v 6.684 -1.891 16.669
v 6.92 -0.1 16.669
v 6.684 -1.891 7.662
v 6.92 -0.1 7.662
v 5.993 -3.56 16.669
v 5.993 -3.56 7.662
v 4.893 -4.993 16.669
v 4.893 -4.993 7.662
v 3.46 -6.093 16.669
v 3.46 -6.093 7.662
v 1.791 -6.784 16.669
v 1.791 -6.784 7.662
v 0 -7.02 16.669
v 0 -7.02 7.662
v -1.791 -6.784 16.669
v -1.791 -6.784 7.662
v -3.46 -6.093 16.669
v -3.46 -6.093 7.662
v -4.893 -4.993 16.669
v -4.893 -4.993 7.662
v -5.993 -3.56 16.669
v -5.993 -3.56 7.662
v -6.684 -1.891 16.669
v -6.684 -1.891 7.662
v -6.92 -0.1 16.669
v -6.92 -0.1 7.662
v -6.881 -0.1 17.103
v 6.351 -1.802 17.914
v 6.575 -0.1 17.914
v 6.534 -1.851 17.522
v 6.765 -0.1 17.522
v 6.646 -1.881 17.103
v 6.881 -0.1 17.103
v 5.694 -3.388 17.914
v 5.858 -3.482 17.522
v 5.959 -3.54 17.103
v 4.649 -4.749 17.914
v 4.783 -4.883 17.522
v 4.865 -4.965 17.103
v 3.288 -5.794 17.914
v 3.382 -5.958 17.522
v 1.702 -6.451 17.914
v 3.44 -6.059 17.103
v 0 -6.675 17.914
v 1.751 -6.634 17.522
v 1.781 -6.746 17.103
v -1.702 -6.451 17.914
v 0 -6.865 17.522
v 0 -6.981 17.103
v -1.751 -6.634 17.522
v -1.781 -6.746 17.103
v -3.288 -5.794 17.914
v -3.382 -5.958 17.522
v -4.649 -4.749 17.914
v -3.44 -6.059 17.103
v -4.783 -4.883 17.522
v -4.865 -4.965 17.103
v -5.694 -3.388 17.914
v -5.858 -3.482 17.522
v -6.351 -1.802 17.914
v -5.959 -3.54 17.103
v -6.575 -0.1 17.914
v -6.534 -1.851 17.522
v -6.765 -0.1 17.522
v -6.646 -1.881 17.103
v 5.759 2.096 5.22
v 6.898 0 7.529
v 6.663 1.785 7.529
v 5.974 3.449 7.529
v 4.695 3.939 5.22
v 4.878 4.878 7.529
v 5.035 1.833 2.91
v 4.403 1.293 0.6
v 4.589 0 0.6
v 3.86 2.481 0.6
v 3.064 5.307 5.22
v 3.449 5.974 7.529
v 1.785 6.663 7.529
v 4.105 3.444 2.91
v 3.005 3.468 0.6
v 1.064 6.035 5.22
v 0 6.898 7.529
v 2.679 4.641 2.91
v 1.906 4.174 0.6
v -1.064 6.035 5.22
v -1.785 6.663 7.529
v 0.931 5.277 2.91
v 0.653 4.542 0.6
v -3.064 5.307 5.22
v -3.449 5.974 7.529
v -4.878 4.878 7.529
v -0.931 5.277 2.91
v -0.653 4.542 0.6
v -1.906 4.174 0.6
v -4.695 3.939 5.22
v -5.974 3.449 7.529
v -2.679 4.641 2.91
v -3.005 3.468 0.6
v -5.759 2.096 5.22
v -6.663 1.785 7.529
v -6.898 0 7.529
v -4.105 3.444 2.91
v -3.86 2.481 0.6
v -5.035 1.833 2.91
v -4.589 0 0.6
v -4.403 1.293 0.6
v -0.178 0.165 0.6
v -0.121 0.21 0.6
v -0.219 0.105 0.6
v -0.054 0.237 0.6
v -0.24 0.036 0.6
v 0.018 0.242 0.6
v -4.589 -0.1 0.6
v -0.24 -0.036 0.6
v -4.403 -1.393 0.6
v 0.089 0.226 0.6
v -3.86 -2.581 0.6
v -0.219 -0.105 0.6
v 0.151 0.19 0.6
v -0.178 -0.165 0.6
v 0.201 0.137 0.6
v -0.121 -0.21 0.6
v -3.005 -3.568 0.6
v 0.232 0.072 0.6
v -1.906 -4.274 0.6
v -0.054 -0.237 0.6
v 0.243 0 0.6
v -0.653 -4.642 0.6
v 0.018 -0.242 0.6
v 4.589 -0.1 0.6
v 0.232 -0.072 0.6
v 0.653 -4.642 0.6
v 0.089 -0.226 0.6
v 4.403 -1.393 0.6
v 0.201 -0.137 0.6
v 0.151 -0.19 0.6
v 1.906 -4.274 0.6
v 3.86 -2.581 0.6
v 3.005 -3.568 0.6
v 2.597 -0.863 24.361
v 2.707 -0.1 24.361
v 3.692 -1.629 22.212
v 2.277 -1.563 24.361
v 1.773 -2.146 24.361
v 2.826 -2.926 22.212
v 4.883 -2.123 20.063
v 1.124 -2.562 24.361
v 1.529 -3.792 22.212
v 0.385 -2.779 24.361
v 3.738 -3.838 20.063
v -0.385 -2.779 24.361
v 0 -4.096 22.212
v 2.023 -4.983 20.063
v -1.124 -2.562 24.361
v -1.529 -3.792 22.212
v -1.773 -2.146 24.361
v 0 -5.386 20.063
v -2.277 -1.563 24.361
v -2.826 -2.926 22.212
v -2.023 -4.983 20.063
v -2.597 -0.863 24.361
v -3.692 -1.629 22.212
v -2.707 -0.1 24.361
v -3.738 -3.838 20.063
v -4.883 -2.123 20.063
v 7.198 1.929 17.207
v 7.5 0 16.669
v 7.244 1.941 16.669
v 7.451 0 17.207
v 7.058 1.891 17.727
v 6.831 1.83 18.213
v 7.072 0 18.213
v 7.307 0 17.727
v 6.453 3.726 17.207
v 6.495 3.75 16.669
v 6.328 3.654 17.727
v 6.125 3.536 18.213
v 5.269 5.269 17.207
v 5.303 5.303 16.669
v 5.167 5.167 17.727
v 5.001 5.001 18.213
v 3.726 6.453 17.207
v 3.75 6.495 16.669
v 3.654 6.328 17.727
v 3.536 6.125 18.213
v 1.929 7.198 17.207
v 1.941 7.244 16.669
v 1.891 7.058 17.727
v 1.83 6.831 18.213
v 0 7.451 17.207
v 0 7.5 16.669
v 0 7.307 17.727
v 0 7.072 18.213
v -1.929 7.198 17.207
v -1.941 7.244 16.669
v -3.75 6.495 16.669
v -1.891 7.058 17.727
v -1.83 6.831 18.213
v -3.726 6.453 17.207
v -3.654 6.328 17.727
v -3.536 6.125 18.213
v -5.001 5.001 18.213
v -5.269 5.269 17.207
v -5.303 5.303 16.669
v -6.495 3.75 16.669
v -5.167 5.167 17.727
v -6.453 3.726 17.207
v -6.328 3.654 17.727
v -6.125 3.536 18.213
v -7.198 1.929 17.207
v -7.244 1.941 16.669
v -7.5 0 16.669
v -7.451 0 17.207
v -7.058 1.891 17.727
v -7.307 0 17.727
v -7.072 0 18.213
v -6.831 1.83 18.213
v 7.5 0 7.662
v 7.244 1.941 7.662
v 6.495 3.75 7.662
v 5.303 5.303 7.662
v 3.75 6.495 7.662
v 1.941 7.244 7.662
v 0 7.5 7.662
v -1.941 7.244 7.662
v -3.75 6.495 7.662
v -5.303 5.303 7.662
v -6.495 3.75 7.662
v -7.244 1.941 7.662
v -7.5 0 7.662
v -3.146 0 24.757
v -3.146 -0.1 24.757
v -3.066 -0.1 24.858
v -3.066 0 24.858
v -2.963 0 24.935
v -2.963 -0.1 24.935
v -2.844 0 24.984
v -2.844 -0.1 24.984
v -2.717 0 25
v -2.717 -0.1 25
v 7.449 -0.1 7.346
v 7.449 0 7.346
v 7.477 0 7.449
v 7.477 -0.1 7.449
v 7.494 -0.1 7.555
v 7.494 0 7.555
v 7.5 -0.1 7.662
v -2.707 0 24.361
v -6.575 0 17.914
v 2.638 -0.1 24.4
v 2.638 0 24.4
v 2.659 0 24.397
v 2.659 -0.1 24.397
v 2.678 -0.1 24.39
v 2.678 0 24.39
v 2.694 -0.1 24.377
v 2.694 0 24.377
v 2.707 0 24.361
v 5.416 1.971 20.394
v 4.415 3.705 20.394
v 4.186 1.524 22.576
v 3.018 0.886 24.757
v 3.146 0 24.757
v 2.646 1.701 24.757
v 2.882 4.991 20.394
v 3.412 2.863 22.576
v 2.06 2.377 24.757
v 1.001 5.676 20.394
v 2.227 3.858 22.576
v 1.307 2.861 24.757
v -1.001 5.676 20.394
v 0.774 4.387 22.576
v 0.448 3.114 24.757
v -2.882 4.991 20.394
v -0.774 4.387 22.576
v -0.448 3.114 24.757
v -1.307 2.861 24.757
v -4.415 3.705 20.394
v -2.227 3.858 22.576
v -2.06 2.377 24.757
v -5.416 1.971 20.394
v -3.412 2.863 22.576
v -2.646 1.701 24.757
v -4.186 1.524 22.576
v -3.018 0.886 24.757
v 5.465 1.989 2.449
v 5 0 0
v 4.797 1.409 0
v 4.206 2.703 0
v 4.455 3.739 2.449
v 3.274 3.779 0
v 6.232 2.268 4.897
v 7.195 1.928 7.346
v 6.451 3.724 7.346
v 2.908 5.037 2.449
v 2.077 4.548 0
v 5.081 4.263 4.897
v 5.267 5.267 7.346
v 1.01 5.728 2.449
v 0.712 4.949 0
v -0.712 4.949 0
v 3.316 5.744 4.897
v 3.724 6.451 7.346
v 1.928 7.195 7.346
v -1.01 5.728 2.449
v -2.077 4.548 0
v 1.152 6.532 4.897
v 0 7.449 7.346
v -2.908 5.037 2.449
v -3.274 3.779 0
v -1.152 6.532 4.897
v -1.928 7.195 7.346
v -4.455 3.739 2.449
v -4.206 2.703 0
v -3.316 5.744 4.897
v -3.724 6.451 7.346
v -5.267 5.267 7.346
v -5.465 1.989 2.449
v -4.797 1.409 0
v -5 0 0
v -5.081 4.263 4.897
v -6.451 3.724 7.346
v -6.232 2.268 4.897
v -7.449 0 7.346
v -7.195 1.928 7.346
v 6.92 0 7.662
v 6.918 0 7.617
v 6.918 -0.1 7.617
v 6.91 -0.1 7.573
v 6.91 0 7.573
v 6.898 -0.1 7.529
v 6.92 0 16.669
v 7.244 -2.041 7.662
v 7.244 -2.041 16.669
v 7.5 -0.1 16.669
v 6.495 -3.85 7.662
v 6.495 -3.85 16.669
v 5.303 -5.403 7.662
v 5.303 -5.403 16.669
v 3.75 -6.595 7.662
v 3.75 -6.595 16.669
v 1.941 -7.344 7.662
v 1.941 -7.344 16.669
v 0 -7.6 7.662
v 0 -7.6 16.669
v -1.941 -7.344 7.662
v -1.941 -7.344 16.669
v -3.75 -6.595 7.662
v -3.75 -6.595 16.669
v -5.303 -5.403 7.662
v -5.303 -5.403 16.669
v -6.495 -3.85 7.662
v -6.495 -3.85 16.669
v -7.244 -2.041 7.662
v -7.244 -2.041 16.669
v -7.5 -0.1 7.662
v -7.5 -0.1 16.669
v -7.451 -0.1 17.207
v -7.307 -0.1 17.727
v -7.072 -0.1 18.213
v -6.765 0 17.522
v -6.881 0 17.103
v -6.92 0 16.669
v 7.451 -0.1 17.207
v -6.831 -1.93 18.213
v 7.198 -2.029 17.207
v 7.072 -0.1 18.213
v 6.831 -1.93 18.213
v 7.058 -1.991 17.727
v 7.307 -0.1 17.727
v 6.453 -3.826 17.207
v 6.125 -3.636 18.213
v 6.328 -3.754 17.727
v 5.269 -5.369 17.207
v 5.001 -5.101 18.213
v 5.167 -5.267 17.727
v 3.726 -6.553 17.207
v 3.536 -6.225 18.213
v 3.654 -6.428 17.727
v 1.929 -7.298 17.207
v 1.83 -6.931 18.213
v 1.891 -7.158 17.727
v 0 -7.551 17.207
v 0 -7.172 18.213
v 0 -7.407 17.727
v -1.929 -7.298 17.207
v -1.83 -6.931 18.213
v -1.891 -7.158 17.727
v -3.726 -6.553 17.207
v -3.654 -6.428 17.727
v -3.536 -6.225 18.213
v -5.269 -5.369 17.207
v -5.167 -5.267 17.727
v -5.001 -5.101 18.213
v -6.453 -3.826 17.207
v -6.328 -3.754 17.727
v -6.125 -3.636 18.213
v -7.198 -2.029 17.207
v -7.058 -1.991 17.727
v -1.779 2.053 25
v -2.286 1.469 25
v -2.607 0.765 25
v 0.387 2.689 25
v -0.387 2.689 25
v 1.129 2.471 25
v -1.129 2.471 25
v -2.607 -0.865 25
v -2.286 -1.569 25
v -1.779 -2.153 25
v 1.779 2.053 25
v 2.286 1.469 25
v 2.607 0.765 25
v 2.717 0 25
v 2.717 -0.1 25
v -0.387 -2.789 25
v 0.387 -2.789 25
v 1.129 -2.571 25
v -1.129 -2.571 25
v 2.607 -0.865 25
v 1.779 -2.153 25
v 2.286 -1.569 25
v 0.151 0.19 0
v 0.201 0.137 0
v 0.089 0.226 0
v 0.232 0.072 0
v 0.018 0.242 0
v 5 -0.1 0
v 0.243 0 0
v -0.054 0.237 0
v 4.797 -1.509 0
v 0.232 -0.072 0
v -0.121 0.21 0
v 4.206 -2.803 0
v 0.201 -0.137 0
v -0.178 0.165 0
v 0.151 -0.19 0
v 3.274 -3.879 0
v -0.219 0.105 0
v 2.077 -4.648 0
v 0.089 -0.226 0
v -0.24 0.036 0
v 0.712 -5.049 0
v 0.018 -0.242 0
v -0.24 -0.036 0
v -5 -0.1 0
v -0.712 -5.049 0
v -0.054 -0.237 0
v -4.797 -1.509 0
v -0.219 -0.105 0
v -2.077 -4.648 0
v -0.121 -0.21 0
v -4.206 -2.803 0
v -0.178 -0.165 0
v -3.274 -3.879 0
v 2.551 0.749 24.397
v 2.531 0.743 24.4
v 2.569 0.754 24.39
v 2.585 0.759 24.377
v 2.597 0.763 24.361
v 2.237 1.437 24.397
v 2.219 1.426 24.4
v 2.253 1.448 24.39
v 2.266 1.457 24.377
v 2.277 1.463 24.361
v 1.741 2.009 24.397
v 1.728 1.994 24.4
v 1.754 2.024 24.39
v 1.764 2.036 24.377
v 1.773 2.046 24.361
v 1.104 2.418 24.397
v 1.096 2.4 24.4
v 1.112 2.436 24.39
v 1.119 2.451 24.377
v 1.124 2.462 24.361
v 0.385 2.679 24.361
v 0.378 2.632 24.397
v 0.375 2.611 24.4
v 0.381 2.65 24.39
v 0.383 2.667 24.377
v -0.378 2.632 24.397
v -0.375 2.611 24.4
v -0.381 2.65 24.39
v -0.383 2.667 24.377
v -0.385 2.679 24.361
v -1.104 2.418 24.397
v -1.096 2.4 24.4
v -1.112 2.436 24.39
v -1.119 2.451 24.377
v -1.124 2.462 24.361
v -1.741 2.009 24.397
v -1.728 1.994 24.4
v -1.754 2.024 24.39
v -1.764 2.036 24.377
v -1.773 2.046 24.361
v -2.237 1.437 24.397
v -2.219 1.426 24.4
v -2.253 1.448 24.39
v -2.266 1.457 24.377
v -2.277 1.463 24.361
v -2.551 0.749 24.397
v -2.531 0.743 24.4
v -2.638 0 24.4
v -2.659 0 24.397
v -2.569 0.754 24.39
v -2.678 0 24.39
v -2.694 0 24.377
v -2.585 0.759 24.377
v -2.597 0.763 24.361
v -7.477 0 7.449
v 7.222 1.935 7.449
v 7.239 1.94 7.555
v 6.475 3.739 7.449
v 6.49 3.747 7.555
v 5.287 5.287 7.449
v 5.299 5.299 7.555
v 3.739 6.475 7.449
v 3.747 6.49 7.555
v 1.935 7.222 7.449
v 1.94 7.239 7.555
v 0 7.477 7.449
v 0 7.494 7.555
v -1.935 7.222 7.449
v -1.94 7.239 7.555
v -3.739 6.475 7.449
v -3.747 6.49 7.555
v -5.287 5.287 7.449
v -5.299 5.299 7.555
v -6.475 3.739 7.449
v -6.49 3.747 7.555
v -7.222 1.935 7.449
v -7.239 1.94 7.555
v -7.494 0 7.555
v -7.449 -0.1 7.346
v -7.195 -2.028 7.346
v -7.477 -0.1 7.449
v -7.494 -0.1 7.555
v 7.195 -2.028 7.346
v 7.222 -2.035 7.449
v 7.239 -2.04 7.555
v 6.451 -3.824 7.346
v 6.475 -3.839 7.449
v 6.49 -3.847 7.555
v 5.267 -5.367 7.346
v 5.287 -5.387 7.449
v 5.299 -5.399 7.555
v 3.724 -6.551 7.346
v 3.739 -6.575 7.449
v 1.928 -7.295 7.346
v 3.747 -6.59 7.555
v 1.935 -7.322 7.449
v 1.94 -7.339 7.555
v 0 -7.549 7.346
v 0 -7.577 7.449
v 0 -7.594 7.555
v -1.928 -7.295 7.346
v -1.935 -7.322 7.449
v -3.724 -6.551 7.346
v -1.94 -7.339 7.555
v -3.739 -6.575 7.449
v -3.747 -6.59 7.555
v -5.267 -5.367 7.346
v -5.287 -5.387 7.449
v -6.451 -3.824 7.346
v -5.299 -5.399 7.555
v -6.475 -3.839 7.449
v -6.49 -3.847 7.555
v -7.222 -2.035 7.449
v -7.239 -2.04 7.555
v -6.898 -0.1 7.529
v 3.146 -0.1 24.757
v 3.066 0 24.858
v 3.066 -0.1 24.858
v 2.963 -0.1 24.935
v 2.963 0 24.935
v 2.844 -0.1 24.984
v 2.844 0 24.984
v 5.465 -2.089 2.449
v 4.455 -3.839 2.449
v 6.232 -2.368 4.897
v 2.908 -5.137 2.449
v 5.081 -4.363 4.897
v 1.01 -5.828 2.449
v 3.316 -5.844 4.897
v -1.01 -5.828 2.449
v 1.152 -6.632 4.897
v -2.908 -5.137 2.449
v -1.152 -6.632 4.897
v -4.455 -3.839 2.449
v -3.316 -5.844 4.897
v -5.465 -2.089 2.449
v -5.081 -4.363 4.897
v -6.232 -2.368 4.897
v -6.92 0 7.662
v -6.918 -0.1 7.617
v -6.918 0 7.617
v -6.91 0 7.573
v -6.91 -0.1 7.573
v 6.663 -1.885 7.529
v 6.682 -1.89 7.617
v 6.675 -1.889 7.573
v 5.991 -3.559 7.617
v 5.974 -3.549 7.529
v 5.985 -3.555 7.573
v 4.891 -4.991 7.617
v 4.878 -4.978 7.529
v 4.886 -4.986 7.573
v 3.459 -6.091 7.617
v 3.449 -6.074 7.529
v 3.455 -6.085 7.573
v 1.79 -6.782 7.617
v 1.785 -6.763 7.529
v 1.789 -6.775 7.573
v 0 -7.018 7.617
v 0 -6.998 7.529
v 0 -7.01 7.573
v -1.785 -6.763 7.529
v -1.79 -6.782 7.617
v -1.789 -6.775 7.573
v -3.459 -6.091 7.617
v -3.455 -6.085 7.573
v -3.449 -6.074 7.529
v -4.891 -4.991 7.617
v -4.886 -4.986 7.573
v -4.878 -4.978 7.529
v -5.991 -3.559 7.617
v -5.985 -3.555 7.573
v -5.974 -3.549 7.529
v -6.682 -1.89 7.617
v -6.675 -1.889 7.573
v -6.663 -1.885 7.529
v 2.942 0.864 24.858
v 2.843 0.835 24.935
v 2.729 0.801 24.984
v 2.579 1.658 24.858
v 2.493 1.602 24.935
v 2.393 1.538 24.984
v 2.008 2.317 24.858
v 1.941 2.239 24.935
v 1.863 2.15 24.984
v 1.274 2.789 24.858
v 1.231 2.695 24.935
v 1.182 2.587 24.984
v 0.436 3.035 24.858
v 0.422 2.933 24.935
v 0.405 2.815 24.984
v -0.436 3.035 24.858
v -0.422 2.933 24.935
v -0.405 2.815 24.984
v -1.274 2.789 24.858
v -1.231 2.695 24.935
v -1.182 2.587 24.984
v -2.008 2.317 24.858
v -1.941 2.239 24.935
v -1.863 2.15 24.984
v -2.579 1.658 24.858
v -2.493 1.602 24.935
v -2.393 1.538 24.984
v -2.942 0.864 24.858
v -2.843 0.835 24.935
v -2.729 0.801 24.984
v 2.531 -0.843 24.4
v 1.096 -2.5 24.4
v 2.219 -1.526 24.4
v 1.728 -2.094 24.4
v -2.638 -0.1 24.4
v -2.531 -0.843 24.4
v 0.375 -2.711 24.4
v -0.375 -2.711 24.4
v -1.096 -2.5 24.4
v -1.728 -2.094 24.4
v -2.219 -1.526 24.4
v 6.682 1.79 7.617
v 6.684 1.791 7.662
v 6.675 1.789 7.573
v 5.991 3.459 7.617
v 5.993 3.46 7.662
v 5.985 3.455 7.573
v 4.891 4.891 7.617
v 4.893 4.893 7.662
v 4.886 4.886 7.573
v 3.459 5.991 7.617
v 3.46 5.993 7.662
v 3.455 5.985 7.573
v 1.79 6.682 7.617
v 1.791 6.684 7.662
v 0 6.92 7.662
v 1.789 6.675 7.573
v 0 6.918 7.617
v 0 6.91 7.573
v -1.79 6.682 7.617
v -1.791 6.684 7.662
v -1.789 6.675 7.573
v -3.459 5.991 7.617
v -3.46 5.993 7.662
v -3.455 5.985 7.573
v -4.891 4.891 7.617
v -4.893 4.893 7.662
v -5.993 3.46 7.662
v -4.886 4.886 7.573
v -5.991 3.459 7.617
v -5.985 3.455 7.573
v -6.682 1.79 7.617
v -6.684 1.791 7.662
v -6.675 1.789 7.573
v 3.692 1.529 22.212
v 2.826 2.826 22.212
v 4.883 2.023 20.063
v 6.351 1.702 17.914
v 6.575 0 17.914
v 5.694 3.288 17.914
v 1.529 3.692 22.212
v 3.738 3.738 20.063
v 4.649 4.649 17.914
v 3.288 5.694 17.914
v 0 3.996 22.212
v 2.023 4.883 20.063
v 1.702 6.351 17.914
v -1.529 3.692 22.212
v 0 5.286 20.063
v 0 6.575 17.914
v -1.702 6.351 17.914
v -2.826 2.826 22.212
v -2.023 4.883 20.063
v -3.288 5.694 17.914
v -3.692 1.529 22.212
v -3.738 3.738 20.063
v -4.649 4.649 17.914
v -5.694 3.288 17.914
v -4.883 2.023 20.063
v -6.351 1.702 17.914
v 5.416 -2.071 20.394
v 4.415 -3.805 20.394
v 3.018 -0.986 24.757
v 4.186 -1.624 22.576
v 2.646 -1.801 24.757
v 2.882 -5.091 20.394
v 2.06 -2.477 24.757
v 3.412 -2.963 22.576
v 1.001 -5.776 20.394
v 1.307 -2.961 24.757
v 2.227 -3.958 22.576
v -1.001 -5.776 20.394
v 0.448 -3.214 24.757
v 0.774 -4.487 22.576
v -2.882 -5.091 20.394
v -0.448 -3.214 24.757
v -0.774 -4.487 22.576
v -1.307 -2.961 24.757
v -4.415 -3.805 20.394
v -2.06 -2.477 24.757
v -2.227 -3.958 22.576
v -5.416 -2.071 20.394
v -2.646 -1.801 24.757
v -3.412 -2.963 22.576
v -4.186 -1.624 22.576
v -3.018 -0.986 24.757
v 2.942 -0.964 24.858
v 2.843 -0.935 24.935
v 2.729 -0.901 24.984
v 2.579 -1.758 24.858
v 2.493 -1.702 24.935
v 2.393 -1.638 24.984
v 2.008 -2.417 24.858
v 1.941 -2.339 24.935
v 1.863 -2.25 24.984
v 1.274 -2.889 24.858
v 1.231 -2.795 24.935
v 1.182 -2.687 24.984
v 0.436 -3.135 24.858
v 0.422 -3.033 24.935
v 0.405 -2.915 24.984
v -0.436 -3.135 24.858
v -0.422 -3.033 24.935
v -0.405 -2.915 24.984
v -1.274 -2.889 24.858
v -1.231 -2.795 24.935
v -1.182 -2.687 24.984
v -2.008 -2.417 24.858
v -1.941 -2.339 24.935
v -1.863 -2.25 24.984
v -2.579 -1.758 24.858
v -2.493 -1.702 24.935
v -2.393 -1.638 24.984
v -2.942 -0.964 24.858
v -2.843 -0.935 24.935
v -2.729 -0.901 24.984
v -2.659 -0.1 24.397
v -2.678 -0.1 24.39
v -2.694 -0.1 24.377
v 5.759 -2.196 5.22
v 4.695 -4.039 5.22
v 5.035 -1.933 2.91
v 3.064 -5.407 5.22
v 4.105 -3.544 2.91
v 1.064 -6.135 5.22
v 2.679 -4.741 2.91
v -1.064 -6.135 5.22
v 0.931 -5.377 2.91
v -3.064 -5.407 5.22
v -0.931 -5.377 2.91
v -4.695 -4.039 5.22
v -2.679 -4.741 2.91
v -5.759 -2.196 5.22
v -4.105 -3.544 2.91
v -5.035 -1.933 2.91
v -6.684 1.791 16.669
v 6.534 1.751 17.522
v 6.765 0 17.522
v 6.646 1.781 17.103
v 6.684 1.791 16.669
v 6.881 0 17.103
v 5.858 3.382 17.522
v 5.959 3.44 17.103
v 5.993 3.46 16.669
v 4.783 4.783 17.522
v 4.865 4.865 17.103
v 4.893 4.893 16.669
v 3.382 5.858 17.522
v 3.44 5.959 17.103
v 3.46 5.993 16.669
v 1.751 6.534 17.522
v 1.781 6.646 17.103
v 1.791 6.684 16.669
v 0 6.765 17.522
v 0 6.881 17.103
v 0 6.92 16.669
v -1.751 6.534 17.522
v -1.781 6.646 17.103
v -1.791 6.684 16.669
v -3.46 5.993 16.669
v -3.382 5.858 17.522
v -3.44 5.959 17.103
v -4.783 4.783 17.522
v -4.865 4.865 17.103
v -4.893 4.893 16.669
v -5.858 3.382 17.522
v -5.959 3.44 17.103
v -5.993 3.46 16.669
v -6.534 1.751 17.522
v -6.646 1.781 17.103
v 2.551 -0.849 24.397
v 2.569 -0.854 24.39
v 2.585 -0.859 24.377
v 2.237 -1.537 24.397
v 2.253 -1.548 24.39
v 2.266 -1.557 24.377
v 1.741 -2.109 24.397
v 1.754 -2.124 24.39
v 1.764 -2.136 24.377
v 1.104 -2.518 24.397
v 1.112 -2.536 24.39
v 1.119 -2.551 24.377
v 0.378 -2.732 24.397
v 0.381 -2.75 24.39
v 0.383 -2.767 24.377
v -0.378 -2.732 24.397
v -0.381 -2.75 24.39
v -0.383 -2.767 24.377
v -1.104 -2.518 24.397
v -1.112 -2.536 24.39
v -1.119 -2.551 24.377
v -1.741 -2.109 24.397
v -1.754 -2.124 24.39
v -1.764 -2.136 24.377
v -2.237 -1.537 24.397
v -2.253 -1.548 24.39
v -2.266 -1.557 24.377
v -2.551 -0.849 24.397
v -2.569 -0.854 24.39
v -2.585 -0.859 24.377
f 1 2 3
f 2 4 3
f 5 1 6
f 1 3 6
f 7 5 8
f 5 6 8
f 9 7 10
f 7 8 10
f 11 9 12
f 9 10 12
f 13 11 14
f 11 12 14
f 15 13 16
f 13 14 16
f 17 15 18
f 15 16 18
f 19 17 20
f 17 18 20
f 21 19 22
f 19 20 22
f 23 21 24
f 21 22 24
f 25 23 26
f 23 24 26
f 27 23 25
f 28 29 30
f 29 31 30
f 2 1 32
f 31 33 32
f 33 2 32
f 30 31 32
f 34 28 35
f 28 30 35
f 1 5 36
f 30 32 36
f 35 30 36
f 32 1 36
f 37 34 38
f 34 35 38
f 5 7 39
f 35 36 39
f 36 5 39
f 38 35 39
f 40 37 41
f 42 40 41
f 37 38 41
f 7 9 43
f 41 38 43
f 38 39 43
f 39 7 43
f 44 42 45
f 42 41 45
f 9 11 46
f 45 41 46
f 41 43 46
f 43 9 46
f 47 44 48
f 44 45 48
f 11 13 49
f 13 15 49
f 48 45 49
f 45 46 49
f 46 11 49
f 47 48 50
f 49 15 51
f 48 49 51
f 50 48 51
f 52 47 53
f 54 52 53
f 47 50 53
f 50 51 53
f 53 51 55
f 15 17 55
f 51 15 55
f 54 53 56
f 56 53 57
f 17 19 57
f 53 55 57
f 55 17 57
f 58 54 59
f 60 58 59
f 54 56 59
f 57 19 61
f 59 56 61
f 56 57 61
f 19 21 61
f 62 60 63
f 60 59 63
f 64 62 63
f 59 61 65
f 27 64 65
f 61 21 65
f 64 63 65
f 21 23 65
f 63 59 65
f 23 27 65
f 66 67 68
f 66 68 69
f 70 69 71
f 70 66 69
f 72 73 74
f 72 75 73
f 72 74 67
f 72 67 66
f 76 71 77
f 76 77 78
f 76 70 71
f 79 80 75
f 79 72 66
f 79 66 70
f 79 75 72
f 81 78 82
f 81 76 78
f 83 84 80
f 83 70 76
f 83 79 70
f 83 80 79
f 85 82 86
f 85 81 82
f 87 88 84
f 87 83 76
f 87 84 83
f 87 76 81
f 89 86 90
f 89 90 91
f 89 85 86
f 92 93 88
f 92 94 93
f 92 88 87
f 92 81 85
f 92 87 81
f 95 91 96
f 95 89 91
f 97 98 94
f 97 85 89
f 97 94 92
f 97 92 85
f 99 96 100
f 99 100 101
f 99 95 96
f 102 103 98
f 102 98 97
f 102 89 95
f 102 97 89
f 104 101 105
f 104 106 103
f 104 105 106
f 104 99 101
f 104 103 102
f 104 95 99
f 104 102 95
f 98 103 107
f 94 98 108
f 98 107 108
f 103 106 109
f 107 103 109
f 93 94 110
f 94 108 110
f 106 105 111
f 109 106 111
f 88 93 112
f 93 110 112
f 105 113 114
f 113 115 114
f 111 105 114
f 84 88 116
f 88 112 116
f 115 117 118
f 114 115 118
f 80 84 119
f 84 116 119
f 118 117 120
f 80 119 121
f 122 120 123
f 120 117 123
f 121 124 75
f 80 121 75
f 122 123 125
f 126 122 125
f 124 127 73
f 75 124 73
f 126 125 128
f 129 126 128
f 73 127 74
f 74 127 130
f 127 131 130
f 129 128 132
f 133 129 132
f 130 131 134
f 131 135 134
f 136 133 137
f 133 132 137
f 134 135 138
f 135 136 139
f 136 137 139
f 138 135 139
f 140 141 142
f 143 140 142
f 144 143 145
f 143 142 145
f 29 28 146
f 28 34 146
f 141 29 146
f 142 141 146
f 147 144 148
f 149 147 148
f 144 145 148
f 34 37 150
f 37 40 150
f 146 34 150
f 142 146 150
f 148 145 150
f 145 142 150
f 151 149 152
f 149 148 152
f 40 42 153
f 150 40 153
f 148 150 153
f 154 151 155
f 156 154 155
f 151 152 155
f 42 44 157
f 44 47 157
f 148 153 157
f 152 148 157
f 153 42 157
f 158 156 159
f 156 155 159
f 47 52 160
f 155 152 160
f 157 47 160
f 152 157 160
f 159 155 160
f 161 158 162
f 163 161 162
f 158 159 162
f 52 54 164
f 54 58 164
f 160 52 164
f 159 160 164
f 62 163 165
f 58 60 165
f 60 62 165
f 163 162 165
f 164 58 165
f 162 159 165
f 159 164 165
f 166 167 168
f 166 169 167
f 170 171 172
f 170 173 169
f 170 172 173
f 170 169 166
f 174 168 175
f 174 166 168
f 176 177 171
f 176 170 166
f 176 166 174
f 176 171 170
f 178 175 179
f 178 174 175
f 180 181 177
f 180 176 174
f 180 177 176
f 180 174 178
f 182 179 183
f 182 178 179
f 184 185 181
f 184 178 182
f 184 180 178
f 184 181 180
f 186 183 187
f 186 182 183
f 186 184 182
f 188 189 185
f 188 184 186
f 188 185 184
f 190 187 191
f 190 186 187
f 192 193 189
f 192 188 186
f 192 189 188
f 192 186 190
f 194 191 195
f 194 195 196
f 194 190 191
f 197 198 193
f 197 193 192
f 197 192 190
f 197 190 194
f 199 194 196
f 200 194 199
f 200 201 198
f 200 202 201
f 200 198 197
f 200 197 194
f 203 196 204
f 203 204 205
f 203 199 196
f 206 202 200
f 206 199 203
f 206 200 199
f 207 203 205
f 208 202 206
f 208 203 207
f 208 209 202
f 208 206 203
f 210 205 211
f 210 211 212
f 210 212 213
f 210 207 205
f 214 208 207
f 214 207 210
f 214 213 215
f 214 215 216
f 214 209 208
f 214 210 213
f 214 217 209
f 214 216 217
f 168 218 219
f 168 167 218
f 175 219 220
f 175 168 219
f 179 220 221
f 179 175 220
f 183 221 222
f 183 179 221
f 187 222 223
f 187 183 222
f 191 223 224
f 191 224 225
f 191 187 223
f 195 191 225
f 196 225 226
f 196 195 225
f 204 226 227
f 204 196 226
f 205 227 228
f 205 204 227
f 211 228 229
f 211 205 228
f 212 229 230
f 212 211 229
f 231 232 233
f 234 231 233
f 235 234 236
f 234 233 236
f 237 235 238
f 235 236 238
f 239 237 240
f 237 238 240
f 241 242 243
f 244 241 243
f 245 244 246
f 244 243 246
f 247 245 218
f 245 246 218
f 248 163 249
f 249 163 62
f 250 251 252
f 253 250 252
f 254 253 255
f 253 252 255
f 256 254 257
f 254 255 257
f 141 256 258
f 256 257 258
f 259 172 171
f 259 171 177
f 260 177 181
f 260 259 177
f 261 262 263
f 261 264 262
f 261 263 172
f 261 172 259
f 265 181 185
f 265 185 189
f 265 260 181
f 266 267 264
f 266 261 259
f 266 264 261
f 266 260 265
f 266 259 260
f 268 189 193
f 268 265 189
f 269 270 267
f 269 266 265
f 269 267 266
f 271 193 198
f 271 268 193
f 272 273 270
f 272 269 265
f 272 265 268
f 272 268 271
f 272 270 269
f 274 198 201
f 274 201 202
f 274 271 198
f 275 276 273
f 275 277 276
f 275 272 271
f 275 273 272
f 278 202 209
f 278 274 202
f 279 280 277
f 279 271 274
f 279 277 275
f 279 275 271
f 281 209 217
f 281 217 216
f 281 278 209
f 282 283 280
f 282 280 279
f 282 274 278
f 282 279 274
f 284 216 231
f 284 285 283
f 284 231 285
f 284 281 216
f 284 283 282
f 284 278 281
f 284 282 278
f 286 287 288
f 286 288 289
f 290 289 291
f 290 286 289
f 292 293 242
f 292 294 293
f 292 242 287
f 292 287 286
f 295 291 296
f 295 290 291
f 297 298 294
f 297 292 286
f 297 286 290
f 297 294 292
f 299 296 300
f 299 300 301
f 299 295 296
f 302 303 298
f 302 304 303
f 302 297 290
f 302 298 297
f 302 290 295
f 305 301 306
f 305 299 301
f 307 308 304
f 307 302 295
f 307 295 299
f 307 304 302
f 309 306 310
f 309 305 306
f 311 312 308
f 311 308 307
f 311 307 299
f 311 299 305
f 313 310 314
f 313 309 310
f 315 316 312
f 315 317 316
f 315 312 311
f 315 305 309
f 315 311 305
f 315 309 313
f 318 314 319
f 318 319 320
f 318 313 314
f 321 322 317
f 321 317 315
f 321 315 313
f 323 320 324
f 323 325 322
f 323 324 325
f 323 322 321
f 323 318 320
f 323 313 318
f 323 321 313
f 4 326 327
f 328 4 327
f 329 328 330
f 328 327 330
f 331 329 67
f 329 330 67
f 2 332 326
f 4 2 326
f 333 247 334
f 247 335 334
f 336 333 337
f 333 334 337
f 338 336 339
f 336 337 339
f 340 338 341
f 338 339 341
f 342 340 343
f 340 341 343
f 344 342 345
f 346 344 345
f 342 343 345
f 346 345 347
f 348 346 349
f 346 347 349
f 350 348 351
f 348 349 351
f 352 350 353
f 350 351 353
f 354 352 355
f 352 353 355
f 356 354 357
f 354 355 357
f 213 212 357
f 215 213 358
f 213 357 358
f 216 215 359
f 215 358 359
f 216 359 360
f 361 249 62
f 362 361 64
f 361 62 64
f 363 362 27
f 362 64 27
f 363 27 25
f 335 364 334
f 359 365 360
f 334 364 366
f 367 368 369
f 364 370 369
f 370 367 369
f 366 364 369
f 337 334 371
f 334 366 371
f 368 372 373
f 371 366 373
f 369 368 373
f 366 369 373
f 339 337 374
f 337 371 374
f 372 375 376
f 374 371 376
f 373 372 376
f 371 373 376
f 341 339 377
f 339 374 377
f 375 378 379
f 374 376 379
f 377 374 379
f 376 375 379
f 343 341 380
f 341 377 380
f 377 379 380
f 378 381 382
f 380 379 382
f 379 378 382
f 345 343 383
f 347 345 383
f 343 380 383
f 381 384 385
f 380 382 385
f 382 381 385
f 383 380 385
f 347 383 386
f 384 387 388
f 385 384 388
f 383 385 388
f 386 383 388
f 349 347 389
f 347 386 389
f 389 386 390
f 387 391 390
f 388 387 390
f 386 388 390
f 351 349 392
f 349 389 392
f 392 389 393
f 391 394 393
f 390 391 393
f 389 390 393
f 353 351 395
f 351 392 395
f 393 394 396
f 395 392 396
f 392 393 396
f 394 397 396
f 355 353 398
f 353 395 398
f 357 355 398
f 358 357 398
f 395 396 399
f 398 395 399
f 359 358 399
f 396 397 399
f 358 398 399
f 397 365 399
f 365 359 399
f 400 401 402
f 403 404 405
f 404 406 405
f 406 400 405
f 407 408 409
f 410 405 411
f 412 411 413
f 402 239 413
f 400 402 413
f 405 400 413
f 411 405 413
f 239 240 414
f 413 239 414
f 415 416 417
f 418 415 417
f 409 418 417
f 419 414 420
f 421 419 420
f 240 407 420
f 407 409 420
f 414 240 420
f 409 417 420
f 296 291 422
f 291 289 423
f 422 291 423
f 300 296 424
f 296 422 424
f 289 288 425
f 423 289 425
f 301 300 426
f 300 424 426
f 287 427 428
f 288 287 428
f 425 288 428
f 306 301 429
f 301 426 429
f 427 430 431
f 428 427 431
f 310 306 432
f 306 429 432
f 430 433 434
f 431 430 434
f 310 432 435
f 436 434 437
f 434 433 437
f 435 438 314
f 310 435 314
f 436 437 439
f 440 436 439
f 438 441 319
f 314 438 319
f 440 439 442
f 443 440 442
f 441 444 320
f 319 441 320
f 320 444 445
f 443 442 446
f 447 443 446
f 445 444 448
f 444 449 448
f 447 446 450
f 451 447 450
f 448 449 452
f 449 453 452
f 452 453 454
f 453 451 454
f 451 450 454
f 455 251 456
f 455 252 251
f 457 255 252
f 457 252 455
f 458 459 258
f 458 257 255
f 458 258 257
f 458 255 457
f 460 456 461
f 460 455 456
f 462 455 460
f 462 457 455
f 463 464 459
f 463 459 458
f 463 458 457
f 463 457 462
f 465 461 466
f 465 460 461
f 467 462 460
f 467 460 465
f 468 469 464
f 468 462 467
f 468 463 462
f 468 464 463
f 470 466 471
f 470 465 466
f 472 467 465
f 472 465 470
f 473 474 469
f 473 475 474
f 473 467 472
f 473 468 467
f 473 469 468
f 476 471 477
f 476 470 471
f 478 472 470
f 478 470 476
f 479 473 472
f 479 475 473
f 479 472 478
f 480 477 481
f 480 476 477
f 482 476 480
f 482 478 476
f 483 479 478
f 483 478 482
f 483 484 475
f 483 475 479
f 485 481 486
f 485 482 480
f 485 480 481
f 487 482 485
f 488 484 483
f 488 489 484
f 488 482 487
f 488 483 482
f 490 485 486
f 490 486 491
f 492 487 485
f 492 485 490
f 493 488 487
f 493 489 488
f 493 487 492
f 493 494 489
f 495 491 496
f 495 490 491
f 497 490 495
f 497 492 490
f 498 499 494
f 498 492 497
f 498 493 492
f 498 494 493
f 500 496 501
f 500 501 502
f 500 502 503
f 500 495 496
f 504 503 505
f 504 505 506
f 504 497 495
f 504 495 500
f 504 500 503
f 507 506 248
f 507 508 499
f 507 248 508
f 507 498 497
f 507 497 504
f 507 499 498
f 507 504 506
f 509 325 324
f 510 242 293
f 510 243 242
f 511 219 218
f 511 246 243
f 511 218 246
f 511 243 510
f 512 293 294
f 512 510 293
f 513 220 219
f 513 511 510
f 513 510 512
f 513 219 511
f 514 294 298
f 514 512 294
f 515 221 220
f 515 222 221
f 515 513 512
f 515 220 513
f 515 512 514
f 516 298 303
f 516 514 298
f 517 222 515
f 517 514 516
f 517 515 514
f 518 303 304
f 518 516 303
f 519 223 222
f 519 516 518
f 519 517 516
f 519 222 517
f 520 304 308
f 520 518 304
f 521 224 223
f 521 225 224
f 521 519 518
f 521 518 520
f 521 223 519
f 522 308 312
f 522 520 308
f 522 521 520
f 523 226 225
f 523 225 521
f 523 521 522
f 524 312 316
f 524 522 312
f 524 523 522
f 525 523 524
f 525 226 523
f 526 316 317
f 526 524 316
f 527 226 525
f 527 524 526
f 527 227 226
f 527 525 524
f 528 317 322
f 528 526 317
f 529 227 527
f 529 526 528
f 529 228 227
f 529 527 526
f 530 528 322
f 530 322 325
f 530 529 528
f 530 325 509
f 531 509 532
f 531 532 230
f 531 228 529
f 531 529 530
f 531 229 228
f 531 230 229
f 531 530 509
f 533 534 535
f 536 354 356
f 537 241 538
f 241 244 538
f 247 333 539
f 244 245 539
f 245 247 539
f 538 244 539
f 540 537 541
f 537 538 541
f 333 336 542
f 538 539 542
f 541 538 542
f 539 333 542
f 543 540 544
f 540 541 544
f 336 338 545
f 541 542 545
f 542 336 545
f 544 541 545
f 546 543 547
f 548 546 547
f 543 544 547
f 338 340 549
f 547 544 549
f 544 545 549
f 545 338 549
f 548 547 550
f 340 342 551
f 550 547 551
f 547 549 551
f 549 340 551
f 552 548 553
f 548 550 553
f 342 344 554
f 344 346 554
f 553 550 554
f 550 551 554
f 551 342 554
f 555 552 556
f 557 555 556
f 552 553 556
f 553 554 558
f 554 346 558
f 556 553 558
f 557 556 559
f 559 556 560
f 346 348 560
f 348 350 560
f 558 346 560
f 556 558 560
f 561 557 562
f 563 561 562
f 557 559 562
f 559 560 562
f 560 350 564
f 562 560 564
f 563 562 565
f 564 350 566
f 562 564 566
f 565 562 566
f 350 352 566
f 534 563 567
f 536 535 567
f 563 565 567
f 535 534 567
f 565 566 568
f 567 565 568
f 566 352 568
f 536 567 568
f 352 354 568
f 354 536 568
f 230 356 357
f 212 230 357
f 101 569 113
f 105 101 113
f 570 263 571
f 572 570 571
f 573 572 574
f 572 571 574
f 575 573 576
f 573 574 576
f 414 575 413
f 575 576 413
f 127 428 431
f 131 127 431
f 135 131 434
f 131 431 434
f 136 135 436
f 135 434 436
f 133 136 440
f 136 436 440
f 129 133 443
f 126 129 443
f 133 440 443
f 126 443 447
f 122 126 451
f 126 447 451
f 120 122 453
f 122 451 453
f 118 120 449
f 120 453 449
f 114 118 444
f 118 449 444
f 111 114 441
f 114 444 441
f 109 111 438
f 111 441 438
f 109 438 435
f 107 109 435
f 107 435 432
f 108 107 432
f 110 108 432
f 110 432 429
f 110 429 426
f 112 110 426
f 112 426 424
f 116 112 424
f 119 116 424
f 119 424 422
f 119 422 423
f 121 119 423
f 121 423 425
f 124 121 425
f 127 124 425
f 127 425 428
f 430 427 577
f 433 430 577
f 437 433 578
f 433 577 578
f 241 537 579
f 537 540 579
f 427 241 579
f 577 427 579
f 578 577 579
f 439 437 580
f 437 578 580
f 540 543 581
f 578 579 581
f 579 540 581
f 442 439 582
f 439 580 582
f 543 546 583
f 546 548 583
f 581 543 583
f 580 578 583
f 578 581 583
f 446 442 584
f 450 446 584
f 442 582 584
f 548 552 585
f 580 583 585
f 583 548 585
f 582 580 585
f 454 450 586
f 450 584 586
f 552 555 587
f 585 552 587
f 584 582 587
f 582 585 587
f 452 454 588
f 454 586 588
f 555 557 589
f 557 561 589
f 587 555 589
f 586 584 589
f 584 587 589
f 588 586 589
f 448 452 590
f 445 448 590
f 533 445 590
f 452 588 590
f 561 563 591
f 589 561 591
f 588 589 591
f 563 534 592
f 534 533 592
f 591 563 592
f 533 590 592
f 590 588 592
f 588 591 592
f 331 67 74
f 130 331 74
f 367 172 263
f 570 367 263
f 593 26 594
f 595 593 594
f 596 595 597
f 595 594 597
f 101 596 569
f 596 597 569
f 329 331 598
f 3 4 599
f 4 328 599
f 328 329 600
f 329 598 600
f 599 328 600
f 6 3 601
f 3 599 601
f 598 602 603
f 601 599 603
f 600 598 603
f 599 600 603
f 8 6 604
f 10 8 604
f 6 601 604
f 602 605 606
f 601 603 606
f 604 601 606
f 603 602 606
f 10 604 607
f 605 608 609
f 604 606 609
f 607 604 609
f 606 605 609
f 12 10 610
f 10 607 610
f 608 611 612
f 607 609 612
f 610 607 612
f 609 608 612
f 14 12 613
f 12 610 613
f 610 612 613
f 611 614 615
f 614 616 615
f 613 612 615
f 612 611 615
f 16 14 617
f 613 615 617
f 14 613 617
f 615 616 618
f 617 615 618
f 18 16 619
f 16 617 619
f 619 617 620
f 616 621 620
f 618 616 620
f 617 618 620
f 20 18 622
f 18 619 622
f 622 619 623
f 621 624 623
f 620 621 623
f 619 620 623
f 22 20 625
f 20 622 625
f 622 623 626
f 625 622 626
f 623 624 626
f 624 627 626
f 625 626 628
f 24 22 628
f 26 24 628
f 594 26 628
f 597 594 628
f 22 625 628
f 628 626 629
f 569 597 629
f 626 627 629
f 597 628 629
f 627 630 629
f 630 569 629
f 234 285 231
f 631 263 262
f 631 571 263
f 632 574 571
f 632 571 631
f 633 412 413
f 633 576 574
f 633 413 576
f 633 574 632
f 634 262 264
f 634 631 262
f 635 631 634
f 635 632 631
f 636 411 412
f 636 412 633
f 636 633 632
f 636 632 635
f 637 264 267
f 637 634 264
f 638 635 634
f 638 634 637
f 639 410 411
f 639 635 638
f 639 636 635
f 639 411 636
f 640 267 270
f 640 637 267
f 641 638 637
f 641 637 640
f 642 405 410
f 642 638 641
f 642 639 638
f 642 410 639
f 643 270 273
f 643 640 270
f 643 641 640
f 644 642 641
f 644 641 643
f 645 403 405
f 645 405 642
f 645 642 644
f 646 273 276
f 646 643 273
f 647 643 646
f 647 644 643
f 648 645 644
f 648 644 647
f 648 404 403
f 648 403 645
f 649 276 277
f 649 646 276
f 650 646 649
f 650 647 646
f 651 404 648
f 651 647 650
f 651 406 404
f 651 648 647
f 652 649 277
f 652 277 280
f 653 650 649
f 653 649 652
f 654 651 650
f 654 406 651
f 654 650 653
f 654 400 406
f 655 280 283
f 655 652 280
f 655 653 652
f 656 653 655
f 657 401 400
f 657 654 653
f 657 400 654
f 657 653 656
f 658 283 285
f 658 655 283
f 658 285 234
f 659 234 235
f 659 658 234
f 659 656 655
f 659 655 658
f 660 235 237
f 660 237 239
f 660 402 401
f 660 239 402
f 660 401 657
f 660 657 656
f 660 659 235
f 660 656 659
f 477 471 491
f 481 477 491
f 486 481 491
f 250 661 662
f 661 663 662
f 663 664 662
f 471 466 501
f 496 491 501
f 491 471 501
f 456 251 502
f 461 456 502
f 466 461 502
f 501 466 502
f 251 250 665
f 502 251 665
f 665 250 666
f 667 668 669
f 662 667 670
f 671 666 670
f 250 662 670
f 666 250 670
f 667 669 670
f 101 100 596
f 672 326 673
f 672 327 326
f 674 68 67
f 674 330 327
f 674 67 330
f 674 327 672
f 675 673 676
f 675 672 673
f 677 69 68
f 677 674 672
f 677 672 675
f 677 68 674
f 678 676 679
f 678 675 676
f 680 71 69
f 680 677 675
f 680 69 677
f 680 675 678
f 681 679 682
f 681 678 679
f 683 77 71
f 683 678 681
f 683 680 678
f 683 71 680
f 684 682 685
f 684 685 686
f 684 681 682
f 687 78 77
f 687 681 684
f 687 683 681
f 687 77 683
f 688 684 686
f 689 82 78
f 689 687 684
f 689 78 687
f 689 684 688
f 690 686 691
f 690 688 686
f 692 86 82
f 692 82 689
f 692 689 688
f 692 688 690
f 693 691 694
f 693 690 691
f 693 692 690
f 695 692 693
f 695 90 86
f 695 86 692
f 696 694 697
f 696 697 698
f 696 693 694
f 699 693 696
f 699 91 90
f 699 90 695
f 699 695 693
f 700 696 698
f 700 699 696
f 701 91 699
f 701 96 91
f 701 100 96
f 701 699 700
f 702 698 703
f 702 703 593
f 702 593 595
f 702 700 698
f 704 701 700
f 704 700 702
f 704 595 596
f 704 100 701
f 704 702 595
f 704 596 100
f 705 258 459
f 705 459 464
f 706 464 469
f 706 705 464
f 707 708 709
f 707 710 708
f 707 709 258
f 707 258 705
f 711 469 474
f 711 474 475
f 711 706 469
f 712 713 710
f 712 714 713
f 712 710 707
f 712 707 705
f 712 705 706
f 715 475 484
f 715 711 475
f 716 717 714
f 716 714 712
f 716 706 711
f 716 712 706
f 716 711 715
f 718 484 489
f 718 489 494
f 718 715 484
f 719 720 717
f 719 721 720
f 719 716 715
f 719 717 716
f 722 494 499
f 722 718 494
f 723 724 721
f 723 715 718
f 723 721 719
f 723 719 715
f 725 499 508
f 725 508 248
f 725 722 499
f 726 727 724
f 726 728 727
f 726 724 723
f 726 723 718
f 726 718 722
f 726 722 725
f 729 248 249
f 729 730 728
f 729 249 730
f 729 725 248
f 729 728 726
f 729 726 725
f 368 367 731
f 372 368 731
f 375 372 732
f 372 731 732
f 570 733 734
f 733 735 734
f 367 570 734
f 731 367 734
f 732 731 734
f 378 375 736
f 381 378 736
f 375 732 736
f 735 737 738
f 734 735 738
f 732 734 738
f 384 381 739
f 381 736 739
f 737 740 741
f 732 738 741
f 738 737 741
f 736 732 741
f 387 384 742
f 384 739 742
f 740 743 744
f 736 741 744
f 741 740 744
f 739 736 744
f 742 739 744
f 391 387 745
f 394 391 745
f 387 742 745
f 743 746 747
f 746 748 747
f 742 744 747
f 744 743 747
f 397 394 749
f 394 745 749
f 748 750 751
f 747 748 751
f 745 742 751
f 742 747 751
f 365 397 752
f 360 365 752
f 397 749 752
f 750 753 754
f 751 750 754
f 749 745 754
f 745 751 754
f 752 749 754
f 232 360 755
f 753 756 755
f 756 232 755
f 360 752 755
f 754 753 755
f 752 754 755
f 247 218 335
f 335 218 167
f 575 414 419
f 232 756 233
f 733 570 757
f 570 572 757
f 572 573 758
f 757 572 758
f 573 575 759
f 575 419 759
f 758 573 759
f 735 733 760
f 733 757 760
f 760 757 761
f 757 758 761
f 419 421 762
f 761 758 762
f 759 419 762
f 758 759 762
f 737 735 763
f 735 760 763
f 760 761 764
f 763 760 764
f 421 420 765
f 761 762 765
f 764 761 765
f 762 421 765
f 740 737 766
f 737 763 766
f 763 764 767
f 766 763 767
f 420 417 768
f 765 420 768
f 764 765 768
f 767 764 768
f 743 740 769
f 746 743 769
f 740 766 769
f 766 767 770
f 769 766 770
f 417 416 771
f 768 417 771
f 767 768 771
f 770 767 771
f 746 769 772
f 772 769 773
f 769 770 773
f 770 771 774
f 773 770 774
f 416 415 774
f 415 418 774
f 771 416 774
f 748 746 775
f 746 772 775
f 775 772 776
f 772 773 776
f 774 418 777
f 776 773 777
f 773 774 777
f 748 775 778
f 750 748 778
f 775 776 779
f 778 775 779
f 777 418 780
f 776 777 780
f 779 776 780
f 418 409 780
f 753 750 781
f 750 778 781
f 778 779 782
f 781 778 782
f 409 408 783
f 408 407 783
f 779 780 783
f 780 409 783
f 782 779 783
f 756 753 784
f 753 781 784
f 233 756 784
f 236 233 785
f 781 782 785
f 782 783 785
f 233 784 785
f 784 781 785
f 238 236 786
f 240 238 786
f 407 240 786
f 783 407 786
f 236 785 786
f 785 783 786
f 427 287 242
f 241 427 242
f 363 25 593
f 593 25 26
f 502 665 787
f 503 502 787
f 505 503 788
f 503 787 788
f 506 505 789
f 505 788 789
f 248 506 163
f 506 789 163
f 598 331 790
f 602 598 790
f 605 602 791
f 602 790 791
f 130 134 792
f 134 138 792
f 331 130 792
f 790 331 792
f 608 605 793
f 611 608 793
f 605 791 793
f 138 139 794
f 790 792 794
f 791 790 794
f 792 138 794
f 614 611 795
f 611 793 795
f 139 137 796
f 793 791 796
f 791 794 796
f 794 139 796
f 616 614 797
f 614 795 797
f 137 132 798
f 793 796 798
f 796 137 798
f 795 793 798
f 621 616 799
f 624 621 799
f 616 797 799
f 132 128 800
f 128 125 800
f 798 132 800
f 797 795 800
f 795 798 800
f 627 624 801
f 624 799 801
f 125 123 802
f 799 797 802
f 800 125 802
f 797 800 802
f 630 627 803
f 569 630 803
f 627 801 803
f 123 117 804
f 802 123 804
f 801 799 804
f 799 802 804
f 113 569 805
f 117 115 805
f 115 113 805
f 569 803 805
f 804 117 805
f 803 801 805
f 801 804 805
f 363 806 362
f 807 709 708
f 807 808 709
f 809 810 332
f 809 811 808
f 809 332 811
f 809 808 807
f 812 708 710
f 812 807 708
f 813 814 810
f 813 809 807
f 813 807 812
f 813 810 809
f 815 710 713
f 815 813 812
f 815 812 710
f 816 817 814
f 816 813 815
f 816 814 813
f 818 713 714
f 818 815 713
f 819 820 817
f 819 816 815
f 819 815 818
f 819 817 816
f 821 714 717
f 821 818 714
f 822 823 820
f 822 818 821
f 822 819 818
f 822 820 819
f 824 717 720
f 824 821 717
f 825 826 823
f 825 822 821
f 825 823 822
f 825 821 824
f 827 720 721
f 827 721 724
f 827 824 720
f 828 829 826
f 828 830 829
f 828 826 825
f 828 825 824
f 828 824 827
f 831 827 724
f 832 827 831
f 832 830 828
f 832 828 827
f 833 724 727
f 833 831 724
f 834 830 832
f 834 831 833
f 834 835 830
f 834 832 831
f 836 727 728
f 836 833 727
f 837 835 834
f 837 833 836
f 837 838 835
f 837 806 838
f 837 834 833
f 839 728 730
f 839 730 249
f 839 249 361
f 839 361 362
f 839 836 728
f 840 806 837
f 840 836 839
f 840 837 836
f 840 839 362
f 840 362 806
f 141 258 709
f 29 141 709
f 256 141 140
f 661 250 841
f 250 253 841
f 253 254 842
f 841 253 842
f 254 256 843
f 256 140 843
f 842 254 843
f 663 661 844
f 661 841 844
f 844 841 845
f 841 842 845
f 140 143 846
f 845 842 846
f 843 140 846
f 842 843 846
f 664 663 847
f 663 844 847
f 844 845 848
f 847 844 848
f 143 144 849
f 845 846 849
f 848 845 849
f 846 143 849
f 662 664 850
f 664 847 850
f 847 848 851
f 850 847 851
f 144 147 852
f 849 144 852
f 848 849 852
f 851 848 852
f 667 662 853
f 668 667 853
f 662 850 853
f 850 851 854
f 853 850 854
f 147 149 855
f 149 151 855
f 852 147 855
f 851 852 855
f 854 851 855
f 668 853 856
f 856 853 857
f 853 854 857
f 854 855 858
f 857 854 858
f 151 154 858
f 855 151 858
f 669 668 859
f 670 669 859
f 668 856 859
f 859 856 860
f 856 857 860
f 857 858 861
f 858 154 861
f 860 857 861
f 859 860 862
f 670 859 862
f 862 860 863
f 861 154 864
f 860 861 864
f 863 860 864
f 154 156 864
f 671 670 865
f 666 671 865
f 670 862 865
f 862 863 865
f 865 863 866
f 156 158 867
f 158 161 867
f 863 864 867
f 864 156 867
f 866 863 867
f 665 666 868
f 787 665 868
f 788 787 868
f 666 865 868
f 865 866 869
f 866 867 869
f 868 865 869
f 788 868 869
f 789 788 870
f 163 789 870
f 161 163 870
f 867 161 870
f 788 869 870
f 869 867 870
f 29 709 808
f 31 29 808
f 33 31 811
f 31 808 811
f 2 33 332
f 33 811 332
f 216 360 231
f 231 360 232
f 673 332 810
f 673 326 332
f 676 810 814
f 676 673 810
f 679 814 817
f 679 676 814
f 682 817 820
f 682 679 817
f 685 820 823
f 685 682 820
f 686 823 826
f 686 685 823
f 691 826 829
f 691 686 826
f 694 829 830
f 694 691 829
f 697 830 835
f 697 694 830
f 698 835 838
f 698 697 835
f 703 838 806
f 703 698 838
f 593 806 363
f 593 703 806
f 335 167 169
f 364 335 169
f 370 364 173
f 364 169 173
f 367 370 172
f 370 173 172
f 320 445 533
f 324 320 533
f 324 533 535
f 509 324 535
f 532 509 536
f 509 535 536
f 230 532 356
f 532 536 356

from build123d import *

# Parameters (mm, degrees)
F2_DEPTH = 0.1
F3_ANGLE = 180
F4_ANGLE = 180
F5_DEPTH = 0.1
F6_R     = 0.2427611579
F7_DEPTH = 1


with BuildPart() as f2:
    # F1 (on Front) → F2 (new body)
    with BuildSketch(Plane.XZ):
        with BuildLine():
            Line((0, 0.6), (0, 0))
            Line((0, 0), (5, 0))
            Line((5, 0), (7.4486832981, 7.3460498942))
            ThreePointArc((7.4486832981, 7.3460498942), (7.4870874576, 7.5020954172), (7.5, 7.6622776602))
            Line((7.5, 7.6622776602), (7.5, 16.6690481052))
            ThreePointArc((7.5, 16.6690481052), (7.3911447846, 17.4698488508), (7.0724787771, 18.2125353714))
            Line((7.0724787771, 18.2125353714), (3.1456512734, 24.7572478777))
            ThreePointArc((3.1456512734, 24.7572478777), (2.963254218, 24.9350999534), (2.7169048105, 25))
            Line((2.7169048105, 25), (0, 25))
            Line((0, 25), (0, 24.4))
            Line((0, 24.4), (2.6383143499, 24.4))
            ThreePointArc((2.6383143499, 24.4), (2.6777302551, 24.3896159925), (2.7069137839, 24.3611596604))
            Line((2.7069137839, 24.3611596604), (6.5751328802, 17.9141278333))
            ThreePointArc((6.5751328802, 17.9141278333), (6.8321901263, 17.3150273733), (6.92, 16.6690481052))
            Line((6.92, 16.6690481052), (6.92, 7.6622776602))
            ThreePointArc((6.92, 7.6622776602), (6.9145767322, 7.5950011181), (6.8984469852, 7.5294619984))
            Line((6.8984469852, 7.5294619984), (4.588626319, 0.6))
            Line((4.588626319, 0.6), (0, 0.6))
        make_face()
    extrude(amount=F2_DEPTH)

    # F2_face (on face) → F3 (revolve)
    with BuildSketch(Plane(origin=(5.1843610202, -0.1, 11.965116571), x_dir=(1, 0, 0), z_dir=(0, -1, 0))):
        with BuildLine():
            Line((-0.5957347012, -11.365116571), (-5.1843610202, -11.365116571))
            Line((-5.1843610202, -11.365116571), (-5.1843610202, -11.965116571))
            Line((-5.1843610202, -11.965116571), (-0.1843610202, -11.965116571))
            Line((-0.1843610202, -11.965116571), (2.2643222778, -4.6190666769))
            ThreePointArc((2.2643222778, -4.6190666769), (2.3027264374, -4.4630211539), (2.3156389798, -4.3028389109))
            Line((2.3156389798, -4.3028389109), (2.3156389798, 4.7039315341))
            ThreePointArc((2.3156389798, 4.7039315341), (2.2067837644, 5.5047322798), (1.8881177569, 6.2474188004))
            Line((1.8881177569, 6.2474188004), (-2.0387097468, 12.7921313067))
            ThreePointArc((-2.0387097468, 12.7921313067), (-2.2211068022, 12.9699833824), (-2.4674562097, 13.034883429))
            Line((-2.4674562097, 13.034883429), (-5.1843610202, 13.034883429))
            Line((-5.1843610202, 13.034883429), (-5.1843610202, 12.434883429))
            Line((-5.1843610202, 12.434883429), (-2.5460466703, 12.434883429))
            ThreePointArc((-2.5460466703, 12.434883429), (-2.5066307651, 12.4244994215), (-2.4774472363, 12.3960430894))
            Line((-2.4774472363, 12.3960430894), (1.39077186, 5.9490112623))
            ThreePointArc((1.39077186, 5.9490112623), (1.6478291061, 5.3499108023), (1.7356389798, 4.7039315341))
            Line((1.7356389798, 4.7039315341), (1.7356389798, -4.3028389109))
            ThreePointArc((1.7356389798, -4.3028389109), (1.730215712, -4.3701154529), (1.714085965, -4.4356545726))
            Line((1.714085965, -4.4356545726), (-0.5957347012, -11.365116571))
        make_face()
    revolve(axis=Axis((0, -0.1, 24.7), (0, 0, -1)), revolution_arc=F3_ANGLE)

    # F1 (on Front) → F4 (revolve)
    with BuildSketch(Plane.XZ):
        with BuildLine():
            Line((0, 0.6), (0, 0))
            Line((0, 0), (5, 0))
            Line((5, 0), (7.4486832981, 7.3460498942))
            ThreePointArc((7.4486832981, 7.3460498942), (7.4870874576, 7.5020954172), (7.5, 7.6622776602))
            Line((7.5, 7.6622776602), (7.5, 16.6690481052))
            ThreePointArc((7.5, 16.6690481052), (7.3911447846, 17.4698488508), (7.0724787771, 18.2125353714))
            Line((7.0724787771, 18.2125353714), (3.1456512734, 24.7572478777))
            ThreePointArc((3.1456512734, 24.7572478777), (2.963254218, 24.9350999534), (2.7169048105, 25))
            Line((2.7169048105, 25), (0, 25))
            Line((0, 25), (0, 24.4))
            Line((0, 24.4), (2.6383143499, 24.4))
            ThreePointArc((2.6383143499, 24.4), (2.6777302551, 24.3896159925), (2.7069137839, 24.3611596604))
            Line((2.7069137839, 24.3611596604), (6.5751328802, 17.9141278333))
            ThreePointArc((6.5751328802, 17.9141278333), (6.8321901263, 17.3150273733), (6.92, 16.6690481052))
            Line((6.92, 16.6690481052), (6.92, 7.6622776602))
            ThreePointArc((6.92, 7.6622776602), (6.9145767322, 7.5950011181), (6.8984469852, 7.5294619984))
            Line((6.8984469852, 7.5294619984), (4.588626319, 0.6))
            Line((4.588626319, 0.6), (0, 0.6))
        make_face()
    revolve(axis=Axis((0, 0, 24.7), (0, 0, 1)), revolution_arc=F4_ANGLE)

    # F5 (add): a face of the model
    f5_faces = [f2.faces().sort_by_distance(p)[0] for p in [
        (-0.2610076627, -0.1, 0.3),
    ]]
    extrude(f5_faces, amount=F5_DEPTH)

    # F6 (on face) → F7 (cut)
    with BuildSketch(Plane(origin=(0, 0, 0), x_dir=(1, 0, 0), z_dir=(0, 0, -1))):
        Circle(F6_R)
    extrude(amount=-F7_DEPTH, mode=Mode.SUBTRACT)


solid = f2.part
